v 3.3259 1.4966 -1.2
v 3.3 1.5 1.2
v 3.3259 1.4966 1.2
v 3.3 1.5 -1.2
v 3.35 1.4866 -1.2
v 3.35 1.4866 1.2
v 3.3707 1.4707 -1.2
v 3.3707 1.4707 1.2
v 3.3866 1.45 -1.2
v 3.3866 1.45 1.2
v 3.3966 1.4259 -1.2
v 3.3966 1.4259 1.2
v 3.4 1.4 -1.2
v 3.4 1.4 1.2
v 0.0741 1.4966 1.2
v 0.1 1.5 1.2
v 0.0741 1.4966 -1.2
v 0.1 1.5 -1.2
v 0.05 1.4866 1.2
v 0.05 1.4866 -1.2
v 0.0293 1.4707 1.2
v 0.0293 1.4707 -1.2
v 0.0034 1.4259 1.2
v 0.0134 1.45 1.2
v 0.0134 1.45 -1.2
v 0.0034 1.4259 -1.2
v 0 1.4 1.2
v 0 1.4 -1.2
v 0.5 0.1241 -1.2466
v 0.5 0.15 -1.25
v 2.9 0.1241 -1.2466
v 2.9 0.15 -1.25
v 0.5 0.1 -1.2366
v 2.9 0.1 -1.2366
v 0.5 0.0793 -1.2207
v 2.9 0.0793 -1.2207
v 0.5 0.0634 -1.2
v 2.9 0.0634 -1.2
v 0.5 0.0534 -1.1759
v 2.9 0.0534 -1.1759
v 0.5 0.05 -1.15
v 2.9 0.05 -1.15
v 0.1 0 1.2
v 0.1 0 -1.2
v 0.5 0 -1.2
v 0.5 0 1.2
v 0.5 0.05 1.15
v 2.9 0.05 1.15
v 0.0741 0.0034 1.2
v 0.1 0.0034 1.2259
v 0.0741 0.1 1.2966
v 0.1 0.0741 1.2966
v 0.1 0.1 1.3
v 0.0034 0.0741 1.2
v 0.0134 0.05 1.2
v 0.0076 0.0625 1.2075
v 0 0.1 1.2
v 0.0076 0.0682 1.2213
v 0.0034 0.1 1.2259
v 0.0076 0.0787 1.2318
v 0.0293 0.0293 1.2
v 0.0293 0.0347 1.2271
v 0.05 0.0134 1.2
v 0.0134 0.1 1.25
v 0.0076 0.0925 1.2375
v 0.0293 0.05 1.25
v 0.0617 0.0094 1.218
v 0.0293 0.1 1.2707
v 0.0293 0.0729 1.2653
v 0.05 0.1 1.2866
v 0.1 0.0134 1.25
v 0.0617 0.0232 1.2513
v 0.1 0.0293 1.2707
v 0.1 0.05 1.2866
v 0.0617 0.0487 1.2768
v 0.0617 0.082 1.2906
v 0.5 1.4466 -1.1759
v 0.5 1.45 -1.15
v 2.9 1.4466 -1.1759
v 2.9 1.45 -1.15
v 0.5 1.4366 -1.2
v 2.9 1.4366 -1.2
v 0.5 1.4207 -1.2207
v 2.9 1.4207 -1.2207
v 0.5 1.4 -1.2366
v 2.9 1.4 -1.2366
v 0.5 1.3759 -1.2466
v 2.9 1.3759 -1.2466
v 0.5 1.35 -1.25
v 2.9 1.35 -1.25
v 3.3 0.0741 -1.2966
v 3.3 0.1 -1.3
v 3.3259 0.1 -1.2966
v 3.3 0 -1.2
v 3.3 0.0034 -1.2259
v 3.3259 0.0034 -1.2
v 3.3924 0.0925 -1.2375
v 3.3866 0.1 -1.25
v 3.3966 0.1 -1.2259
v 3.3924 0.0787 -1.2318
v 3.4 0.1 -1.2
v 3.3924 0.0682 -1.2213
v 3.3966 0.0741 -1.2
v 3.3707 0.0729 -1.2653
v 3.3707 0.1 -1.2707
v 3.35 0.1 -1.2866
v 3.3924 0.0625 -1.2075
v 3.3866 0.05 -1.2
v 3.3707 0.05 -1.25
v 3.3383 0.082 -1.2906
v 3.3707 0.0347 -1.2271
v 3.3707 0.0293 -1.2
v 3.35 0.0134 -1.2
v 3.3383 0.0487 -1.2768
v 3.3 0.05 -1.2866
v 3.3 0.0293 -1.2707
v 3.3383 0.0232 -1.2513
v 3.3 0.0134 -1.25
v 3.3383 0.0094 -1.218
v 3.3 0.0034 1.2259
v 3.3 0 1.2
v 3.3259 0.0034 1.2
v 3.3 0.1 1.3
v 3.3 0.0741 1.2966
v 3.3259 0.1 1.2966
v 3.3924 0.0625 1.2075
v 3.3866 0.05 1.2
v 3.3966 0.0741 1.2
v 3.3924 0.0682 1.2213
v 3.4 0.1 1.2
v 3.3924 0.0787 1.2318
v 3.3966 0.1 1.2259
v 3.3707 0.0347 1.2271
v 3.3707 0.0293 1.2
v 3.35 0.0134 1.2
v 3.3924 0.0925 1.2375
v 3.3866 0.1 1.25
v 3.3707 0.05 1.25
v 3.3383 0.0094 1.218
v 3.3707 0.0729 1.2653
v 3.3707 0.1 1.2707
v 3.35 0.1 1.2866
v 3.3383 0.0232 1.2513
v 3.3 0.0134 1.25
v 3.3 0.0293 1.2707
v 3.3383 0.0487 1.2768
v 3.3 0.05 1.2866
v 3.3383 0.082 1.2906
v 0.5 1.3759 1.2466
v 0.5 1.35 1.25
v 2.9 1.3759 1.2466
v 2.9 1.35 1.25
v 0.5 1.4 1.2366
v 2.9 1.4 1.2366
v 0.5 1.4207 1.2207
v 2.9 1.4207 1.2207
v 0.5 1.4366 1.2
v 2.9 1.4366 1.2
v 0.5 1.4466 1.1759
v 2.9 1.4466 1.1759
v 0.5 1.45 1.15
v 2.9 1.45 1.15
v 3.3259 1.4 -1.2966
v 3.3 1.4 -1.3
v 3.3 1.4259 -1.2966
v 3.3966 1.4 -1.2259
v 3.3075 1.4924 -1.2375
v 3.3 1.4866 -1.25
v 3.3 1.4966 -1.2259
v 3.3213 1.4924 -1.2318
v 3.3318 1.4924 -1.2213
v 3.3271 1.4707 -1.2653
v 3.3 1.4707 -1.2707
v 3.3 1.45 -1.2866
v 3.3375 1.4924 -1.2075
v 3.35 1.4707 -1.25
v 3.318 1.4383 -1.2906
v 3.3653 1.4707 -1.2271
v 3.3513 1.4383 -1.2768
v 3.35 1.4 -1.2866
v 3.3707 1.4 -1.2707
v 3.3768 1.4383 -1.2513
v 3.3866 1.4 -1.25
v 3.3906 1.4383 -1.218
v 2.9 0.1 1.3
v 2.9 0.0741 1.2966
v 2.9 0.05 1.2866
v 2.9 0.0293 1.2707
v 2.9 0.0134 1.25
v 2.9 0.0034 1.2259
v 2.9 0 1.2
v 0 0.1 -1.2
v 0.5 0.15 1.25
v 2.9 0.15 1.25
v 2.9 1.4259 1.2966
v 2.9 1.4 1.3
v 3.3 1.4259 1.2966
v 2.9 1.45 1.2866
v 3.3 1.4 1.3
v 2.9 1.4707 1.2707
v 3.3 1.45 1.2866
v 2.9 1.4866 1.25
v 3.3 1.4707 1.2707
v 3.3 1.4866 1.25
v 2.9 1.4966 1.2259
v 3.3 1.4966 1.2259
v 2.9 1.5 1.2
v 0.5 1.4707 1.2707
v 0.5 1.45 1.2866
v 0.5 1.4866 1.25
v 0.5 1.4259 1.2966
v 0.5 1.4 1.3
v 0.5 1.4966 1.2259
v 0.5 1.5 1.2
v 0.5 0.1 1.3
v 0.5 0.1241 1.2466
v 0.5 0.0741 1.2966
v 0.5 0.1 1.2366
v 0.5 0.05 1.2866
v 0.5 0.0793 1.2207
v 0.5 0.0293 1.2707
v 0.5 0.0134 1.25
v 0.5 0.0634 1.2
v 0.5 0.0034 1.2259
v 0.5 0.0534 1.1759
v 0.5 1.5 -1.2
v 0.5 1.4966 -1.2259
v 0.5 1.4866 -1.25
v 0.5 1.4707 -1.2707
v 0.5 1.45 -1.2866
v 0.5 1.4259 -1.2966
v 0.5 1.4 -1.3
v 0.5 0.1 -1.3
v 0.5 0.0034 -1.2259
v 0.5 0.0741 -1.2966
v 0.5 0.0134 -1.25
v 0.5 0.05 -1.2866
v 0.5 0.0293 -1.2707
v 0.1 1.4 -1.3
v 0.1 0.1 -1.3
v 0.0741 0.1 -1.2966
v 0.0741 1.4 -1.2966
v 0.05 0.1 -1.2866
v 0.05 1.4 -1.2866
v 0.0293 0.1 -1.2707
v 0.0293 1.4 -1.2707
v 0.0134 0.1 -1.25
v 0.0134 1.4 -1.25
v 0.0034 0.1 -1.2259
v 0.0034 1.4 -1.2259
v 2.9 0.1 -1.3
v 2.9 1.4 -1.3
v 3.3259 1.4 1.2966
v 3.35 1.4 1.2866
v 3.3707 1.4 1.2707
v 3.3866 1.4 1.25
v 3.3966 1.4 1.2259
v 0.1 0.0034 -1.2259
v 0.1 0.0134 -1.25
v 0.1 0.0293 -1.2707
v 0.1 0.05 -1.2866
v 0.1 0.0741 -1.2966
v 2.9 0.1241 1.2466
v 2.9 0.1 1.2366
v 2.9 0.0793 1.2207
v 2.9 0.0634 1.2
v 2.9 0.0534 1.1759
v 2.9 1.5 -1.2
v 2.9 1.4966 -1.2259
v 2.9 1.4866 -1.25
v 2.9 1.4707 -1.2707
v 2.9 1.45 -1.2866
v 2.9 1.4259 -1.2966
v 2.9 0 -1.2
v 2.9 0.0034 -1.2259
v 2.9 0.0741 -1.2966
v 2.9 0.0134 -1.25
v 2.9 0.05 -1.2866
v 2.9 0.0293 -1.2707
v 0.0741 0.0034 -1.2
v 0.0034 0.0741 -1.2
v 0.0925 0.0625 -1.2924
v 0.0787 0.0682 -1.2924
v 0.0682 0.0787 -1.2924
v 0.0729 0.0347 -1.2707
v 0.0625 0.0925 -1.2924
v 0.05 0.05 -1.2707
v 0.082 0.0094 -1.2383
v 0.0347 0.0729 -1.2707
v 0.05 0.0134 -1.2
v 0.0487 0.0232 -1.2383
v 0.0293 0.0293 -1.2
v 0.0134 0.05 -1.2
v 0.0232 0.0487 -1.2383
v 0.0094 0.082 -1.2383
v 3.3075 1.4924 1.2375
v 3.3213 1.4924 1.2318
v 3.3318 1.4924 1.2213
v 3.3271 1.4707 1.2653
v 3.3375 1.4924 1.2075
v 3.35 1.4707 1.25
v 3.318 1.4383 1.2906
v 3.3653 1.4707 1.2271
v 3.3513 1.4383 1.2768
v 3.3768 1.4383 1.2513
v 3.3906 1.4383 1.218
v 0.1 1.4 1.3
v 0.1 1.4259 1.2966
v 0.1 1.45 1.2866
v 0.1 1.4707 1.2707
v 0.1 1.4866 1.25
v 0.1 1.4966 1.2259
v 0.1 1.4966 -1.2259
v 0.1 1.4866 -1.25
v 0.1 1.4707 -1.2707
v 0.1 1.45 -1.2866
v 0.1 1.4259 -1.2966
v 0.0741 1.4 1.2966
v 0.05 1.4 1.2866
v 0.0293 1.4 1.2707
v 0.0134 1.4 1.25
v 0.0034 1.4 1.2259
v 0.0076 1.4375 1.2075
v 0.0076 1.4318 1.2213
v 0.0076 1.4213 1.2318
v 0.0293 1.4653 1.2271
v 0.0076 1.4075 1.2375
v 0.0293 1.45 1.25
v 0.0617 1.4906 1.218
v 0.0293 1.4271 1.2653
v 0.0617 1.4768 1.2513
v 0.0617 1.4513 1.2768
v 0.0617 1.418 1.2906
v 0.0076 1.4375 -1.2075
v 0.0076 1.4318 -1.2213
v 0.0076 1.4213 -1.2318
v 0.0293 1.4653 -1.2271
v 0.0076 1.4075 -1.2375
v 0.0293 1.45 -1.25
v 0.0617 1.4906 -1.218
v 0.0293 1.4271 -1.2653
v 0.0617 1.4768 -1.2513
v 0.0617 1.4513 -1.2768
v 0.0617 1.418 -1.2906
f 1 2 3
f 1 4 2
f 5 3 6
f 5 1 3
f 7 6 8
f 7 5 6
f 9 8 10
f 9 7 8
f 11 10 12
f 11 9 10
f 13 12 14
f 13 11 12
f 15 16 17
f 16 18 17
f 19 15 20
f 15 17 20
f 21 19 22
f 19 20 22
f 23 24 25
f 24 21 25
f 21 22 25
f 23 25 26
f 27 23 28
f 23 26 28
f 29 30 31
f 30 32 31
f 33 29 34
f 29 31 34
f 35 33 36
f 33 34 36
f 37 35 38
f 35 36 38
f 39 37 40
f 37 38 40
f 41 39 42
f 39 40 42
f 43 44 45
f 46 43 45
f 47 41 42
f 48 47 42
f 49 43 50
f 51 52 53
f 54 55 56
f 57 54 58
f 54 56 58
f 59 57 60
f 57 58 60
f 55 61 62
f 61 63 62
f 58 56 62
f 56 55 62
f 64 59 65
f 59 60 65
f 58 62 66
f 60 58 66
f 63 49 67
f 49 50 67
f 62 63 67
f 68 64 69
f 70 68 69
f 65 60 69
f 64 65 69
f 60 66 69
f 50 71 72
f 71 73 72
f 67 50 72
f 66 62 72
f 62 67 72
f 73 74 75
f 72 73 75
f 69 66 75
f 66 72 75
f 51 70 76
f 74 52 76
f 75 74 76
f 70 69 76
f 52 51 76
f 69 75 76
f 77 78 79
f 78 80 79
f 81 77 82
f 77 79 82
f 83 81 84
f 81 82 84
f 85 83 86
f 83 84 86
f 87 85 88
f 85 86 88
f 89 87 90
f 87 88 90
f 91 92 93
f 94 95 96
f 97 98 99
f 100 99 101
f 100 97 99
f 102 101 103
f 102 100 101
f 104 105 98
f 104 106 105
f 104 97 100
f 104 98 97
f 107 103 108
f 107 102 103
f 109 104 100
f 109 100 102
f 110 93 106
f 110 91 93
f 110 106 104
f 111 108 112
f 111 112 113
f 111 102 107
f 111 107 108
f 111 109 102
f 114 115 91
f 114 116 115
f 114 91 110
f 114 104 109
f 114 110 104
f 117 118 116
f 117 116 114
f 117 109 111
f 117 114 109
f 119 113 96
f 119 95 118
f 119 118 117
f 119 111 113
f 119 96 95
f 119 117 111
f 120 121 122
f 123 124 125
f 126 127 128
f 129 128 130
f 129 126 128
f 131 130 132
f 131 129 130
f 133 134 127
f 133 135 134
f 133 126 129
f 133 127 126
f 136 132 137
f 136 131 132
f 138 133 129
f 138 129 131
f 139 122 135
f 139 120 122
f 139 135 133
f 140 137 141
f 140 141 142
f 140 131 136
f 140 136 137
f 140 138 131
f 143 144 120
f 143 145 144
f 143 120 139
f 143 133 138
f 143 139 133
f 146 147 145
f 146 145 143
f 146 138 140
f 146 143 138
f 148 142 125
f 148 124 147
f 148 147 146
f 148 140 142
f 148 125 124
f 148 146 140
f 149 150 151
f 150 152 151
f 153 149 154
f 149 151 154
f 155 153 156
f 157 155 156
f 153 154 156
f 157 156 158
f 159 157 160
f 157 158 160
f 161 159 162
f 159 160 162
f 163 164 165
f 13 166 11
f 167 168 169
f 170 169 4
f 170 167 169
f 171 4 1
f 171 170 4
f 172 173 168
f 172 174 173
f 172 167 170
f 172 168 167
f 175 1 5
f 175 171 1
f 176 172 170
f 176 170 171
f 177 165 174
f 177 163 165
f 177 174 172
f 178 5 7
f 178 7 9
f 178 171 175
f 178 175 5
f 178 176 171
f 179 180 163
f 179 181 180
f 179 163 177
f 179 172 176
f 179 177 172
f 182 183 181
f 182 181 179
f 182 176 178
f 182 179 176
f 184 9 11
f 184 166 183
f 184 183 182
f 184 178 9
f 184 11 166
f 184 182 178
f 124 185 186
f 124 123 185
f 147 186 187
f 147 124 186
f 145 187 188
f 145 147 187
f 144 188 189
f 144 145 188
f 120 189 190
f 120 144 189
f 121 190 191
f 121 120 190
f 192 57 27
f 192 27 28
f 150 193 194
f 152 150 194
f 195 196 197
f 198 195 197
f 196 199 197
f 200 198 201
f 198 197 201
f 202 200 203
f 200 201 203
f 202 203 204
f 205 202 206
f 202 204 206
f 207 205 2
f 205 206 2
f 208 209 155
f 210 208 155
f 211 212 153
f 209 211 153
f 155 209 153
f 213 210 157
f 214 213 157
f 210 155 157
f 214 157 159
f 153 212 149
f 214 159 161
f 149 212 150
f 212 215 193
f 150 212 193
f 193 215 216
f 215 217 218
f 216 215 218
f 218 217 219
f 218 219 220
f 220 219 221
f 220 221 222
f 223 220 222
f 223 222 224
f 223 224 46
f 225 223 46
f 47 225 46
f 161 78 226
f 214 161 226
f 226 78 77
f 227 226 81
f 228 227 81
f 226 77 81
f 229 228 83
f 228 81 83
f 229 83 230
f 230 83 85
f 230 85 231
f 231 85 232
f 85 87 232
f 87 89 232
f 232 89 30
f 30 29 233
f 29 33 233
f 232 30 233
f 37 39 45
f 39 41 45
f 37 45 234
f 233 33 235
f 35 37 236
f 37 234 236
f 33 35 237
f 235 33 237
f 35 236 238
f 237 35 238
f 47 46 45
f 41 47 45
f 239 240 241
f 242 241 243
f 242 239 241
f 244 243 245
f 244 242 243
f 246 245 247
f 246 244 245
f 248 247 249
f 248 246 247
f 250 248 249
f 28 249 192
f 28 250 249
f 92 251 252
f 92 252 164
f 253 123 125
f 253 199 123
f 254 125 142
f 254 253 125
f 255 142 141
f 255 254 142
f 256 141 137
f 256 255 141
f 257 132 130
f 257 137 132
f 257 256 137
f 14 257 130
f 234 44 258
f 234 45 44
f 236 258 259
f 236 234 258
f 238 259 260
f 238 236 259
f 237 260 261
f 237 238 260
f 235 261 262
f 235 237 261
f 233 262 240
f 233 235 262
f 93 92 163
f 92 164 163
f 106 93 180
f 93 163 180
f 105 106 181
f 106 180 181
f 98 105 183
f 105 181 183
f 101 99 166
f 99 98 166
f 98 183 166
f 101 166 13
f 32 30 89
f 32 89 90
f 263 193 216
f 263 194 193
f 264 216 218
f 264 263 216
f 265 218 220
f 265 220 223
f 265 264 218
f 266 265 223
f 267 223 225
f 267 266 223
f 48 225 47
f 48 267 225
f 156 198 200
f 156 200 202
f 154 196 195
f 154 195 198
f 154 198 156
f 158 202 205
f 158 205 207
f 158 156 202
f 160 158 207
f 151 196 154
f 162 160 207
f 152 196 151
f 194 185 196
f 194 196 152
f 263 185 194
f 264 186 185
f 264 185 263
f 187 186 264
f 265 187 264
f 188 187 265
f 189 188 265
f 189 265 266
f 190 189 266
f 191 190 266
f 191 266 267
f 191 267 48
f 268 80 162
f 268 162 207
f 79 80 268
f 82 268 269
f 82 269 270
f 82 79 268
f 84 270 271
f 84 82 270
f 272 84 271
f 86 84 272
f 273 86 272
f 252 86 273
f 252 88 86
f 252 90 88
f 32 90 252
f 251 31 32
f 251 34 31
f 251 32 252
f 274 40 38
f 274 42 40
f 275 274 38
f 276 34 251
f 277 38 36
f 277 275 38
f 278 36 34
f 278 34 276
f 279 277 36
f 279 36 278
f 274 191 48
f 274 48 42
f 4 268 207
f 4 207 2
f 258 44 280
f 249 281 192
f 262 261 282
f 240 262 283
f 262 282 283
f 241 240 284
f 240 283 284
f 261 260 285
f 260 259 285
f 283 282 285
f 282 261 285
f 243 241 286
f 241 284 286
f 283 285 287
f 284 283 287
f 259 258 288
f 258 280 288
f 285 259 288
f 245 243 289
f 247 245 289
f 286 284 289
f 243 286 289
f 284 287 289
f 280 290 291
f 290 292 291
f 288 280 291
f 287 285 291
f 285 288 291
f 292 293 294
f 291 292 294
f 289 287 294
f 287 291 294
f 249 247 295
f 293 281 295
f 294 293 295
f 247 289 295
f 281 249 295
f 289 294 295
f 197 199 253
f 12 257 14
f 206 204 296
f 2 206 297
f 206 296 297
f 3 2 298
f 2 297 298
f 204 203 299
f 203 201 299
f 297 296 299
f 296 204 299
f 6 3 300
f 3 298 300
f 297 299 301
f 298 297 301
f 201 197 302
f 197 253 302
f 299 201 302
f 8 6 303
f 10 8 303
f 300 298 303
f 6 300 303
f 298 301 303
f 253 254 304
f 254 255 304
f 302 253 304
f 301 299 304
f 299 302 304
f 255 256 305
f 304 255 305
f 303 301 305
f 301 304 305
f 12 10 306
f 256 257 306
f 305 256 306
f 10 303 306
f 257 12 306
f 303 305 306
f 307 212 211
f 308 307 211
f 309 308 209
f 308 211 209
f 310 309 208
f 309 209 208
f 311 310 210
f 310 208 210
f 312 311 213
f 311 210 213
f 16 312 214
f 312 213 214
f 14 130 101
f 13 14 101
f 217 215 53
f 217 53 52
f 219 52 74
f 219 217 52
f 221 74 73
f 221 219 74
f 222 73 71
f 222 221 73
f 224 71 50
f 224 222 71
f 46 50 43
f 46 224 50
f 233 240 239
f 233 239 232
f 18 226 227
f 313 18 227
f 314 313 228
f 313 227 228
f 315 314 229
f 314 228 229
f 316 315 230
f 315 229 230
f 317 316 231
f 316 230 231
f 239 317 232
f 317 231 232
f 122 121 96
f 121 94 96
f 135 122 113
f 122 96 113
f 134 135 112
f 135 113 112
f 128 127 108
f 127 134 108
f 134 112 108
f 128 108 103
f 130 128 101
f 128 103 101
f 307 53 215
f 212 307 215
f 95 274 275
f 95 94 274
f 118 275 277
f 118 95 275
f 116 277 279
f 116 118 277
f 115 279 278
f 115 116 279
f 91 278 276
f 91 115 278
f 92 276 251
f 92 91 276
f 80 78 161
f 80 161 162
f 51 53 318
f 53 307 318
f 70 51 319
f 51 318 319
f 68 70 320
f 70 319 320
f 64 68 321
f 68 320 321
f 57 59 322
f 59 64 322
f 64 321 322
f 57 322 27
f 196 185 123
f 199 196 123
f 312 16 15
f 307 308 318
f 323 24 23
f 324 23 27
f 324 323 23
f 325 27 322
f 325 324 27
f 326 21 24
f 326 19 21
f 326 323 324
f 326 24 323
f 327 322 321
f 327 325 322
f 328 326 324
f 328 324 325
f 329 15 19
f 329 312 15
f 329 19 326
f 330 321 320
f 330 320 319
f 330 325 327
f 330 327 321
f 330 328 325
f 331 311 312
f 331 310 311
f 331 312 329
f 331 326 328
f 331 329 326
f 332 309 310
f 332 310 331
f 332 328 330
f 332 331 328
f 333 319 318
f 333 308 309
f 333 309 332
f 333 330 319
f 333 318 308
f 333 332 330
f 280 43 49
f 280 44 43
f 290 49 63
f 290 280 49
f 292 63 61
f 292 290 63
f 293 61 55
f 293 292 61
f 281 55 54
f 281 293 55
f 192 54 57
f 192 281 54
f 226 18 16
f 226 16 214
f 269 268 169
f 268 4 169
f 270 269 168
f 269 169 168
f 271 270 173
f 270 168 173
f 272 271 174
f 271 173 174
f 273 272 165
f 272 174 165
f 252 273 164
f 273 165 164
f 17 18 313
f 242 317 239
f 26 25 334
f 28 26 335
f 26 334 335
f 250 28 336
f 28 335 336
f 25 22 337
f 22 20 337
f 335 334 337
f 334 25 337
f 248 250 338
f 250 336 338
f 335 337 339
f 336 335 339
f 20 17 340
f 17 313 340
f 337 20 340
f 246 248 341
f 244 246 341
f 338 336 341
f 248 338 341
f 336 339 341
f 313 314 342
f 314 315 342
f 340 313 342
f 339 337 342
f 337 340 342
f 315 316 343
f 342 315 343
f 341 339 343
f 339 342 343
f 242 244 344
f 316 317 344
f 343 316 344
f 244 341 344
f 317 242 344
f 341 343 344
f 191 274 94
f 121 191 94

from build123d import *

# Parameters (mm, degrees)
SKETCH1_W             = 0.5
SKETCH1_H             = 2.6
BOSS_EXTRUDE1_DEPTH   = 1.5
BOSS_EXTRUDE1_2_DEPTH = 1.5
BOSS_EXTRUDE2_START   = 0.05
SKETCH2_W             = 2.4
SKETCH2_H             = 2.5
BOSS_EXTRUDE2_DEPTH   = 1.4
FILLET1_R             = 0.1


with BuildPart() as part:
    # Sketch1 → Boss-Extrude1 (new body)
    with BuildSketch(Plane(origin=(0, 0, 0), x_dir=(1, 0, 0), z_dir=(0, 1, 0))):
        with Locations((0.25, 0)):
            Rectangle(SKETCH1_W, SKETCH1_H)
    extrude(amount=BOSS_EXTRUDE1_DEPTH)



with BuildPart() as body_2:
    # Sketch1 → Boss-Extrude1 2 (new body)
    with BuildSketch(Plane(origin=(0, 0, 0), x_dir=(1, 0, 0), z_dir=(0, 1, 0))):
        with Locations((3.15, 0)):
            Rectangle(SKETCH1_W, SKETCH1_H)
    extrude(amount=BOSS_EXTRUDE1_2_DEPTH)


with BuildPart() as part_1:
    add(part.part)

    add(body_2.part)  # Boss-Extrude2 merges body 2
    # Sketch2 → Boss-Extrude2 (add)
    with BuildSketch(Plane(origin=(0, 0, 0), x_dir=(1, 0, 0), z_dir=(0, 1, 0)).offset(BOSS_EXTRUDE2_START)):
        with Locations((1.7, 0)):
            Rectangle(SKETCH2_W, SKETCH2_H)
    extrude(amount=BOSS_EXTRUDE2_DEPTH)

    # Fillet1
    fillet1_edges = [part_1.edges().sort_by_distance(p)[0] for p in [
        (0.25, 1.5, 1.3),
        (1.7, 0.05, -1.25),
        (1.7, 0.05, 1.25),
        (1.7, 1.45, -1.25),
        (1.7, 1.45, 1.25),
        (3.15, 0, -1.3),
        (3.4, 0.75, -1.3),
        (3.15, 0, 1.3),
        (3.4, 0, 0),
        (3.4, 0.75, 1.3),
        (3.15, 1.5, -1.3),
        (3.15, 1.5, 1.3),
        (3.4, 1.5, 0),
        (0.25, 1.5, -1.3),
        (0.25, 0, 1.3),
        (0, 0, 0),
        (0.25, 0, -1.3),
        (0, 1.5, 0),
        (0, 0.75, 1.3),
        (0, 0.75, -1.3),
    ]]
    fillet(fillet1_edges, radius=FILLET1_R)


solid = part_1.part
